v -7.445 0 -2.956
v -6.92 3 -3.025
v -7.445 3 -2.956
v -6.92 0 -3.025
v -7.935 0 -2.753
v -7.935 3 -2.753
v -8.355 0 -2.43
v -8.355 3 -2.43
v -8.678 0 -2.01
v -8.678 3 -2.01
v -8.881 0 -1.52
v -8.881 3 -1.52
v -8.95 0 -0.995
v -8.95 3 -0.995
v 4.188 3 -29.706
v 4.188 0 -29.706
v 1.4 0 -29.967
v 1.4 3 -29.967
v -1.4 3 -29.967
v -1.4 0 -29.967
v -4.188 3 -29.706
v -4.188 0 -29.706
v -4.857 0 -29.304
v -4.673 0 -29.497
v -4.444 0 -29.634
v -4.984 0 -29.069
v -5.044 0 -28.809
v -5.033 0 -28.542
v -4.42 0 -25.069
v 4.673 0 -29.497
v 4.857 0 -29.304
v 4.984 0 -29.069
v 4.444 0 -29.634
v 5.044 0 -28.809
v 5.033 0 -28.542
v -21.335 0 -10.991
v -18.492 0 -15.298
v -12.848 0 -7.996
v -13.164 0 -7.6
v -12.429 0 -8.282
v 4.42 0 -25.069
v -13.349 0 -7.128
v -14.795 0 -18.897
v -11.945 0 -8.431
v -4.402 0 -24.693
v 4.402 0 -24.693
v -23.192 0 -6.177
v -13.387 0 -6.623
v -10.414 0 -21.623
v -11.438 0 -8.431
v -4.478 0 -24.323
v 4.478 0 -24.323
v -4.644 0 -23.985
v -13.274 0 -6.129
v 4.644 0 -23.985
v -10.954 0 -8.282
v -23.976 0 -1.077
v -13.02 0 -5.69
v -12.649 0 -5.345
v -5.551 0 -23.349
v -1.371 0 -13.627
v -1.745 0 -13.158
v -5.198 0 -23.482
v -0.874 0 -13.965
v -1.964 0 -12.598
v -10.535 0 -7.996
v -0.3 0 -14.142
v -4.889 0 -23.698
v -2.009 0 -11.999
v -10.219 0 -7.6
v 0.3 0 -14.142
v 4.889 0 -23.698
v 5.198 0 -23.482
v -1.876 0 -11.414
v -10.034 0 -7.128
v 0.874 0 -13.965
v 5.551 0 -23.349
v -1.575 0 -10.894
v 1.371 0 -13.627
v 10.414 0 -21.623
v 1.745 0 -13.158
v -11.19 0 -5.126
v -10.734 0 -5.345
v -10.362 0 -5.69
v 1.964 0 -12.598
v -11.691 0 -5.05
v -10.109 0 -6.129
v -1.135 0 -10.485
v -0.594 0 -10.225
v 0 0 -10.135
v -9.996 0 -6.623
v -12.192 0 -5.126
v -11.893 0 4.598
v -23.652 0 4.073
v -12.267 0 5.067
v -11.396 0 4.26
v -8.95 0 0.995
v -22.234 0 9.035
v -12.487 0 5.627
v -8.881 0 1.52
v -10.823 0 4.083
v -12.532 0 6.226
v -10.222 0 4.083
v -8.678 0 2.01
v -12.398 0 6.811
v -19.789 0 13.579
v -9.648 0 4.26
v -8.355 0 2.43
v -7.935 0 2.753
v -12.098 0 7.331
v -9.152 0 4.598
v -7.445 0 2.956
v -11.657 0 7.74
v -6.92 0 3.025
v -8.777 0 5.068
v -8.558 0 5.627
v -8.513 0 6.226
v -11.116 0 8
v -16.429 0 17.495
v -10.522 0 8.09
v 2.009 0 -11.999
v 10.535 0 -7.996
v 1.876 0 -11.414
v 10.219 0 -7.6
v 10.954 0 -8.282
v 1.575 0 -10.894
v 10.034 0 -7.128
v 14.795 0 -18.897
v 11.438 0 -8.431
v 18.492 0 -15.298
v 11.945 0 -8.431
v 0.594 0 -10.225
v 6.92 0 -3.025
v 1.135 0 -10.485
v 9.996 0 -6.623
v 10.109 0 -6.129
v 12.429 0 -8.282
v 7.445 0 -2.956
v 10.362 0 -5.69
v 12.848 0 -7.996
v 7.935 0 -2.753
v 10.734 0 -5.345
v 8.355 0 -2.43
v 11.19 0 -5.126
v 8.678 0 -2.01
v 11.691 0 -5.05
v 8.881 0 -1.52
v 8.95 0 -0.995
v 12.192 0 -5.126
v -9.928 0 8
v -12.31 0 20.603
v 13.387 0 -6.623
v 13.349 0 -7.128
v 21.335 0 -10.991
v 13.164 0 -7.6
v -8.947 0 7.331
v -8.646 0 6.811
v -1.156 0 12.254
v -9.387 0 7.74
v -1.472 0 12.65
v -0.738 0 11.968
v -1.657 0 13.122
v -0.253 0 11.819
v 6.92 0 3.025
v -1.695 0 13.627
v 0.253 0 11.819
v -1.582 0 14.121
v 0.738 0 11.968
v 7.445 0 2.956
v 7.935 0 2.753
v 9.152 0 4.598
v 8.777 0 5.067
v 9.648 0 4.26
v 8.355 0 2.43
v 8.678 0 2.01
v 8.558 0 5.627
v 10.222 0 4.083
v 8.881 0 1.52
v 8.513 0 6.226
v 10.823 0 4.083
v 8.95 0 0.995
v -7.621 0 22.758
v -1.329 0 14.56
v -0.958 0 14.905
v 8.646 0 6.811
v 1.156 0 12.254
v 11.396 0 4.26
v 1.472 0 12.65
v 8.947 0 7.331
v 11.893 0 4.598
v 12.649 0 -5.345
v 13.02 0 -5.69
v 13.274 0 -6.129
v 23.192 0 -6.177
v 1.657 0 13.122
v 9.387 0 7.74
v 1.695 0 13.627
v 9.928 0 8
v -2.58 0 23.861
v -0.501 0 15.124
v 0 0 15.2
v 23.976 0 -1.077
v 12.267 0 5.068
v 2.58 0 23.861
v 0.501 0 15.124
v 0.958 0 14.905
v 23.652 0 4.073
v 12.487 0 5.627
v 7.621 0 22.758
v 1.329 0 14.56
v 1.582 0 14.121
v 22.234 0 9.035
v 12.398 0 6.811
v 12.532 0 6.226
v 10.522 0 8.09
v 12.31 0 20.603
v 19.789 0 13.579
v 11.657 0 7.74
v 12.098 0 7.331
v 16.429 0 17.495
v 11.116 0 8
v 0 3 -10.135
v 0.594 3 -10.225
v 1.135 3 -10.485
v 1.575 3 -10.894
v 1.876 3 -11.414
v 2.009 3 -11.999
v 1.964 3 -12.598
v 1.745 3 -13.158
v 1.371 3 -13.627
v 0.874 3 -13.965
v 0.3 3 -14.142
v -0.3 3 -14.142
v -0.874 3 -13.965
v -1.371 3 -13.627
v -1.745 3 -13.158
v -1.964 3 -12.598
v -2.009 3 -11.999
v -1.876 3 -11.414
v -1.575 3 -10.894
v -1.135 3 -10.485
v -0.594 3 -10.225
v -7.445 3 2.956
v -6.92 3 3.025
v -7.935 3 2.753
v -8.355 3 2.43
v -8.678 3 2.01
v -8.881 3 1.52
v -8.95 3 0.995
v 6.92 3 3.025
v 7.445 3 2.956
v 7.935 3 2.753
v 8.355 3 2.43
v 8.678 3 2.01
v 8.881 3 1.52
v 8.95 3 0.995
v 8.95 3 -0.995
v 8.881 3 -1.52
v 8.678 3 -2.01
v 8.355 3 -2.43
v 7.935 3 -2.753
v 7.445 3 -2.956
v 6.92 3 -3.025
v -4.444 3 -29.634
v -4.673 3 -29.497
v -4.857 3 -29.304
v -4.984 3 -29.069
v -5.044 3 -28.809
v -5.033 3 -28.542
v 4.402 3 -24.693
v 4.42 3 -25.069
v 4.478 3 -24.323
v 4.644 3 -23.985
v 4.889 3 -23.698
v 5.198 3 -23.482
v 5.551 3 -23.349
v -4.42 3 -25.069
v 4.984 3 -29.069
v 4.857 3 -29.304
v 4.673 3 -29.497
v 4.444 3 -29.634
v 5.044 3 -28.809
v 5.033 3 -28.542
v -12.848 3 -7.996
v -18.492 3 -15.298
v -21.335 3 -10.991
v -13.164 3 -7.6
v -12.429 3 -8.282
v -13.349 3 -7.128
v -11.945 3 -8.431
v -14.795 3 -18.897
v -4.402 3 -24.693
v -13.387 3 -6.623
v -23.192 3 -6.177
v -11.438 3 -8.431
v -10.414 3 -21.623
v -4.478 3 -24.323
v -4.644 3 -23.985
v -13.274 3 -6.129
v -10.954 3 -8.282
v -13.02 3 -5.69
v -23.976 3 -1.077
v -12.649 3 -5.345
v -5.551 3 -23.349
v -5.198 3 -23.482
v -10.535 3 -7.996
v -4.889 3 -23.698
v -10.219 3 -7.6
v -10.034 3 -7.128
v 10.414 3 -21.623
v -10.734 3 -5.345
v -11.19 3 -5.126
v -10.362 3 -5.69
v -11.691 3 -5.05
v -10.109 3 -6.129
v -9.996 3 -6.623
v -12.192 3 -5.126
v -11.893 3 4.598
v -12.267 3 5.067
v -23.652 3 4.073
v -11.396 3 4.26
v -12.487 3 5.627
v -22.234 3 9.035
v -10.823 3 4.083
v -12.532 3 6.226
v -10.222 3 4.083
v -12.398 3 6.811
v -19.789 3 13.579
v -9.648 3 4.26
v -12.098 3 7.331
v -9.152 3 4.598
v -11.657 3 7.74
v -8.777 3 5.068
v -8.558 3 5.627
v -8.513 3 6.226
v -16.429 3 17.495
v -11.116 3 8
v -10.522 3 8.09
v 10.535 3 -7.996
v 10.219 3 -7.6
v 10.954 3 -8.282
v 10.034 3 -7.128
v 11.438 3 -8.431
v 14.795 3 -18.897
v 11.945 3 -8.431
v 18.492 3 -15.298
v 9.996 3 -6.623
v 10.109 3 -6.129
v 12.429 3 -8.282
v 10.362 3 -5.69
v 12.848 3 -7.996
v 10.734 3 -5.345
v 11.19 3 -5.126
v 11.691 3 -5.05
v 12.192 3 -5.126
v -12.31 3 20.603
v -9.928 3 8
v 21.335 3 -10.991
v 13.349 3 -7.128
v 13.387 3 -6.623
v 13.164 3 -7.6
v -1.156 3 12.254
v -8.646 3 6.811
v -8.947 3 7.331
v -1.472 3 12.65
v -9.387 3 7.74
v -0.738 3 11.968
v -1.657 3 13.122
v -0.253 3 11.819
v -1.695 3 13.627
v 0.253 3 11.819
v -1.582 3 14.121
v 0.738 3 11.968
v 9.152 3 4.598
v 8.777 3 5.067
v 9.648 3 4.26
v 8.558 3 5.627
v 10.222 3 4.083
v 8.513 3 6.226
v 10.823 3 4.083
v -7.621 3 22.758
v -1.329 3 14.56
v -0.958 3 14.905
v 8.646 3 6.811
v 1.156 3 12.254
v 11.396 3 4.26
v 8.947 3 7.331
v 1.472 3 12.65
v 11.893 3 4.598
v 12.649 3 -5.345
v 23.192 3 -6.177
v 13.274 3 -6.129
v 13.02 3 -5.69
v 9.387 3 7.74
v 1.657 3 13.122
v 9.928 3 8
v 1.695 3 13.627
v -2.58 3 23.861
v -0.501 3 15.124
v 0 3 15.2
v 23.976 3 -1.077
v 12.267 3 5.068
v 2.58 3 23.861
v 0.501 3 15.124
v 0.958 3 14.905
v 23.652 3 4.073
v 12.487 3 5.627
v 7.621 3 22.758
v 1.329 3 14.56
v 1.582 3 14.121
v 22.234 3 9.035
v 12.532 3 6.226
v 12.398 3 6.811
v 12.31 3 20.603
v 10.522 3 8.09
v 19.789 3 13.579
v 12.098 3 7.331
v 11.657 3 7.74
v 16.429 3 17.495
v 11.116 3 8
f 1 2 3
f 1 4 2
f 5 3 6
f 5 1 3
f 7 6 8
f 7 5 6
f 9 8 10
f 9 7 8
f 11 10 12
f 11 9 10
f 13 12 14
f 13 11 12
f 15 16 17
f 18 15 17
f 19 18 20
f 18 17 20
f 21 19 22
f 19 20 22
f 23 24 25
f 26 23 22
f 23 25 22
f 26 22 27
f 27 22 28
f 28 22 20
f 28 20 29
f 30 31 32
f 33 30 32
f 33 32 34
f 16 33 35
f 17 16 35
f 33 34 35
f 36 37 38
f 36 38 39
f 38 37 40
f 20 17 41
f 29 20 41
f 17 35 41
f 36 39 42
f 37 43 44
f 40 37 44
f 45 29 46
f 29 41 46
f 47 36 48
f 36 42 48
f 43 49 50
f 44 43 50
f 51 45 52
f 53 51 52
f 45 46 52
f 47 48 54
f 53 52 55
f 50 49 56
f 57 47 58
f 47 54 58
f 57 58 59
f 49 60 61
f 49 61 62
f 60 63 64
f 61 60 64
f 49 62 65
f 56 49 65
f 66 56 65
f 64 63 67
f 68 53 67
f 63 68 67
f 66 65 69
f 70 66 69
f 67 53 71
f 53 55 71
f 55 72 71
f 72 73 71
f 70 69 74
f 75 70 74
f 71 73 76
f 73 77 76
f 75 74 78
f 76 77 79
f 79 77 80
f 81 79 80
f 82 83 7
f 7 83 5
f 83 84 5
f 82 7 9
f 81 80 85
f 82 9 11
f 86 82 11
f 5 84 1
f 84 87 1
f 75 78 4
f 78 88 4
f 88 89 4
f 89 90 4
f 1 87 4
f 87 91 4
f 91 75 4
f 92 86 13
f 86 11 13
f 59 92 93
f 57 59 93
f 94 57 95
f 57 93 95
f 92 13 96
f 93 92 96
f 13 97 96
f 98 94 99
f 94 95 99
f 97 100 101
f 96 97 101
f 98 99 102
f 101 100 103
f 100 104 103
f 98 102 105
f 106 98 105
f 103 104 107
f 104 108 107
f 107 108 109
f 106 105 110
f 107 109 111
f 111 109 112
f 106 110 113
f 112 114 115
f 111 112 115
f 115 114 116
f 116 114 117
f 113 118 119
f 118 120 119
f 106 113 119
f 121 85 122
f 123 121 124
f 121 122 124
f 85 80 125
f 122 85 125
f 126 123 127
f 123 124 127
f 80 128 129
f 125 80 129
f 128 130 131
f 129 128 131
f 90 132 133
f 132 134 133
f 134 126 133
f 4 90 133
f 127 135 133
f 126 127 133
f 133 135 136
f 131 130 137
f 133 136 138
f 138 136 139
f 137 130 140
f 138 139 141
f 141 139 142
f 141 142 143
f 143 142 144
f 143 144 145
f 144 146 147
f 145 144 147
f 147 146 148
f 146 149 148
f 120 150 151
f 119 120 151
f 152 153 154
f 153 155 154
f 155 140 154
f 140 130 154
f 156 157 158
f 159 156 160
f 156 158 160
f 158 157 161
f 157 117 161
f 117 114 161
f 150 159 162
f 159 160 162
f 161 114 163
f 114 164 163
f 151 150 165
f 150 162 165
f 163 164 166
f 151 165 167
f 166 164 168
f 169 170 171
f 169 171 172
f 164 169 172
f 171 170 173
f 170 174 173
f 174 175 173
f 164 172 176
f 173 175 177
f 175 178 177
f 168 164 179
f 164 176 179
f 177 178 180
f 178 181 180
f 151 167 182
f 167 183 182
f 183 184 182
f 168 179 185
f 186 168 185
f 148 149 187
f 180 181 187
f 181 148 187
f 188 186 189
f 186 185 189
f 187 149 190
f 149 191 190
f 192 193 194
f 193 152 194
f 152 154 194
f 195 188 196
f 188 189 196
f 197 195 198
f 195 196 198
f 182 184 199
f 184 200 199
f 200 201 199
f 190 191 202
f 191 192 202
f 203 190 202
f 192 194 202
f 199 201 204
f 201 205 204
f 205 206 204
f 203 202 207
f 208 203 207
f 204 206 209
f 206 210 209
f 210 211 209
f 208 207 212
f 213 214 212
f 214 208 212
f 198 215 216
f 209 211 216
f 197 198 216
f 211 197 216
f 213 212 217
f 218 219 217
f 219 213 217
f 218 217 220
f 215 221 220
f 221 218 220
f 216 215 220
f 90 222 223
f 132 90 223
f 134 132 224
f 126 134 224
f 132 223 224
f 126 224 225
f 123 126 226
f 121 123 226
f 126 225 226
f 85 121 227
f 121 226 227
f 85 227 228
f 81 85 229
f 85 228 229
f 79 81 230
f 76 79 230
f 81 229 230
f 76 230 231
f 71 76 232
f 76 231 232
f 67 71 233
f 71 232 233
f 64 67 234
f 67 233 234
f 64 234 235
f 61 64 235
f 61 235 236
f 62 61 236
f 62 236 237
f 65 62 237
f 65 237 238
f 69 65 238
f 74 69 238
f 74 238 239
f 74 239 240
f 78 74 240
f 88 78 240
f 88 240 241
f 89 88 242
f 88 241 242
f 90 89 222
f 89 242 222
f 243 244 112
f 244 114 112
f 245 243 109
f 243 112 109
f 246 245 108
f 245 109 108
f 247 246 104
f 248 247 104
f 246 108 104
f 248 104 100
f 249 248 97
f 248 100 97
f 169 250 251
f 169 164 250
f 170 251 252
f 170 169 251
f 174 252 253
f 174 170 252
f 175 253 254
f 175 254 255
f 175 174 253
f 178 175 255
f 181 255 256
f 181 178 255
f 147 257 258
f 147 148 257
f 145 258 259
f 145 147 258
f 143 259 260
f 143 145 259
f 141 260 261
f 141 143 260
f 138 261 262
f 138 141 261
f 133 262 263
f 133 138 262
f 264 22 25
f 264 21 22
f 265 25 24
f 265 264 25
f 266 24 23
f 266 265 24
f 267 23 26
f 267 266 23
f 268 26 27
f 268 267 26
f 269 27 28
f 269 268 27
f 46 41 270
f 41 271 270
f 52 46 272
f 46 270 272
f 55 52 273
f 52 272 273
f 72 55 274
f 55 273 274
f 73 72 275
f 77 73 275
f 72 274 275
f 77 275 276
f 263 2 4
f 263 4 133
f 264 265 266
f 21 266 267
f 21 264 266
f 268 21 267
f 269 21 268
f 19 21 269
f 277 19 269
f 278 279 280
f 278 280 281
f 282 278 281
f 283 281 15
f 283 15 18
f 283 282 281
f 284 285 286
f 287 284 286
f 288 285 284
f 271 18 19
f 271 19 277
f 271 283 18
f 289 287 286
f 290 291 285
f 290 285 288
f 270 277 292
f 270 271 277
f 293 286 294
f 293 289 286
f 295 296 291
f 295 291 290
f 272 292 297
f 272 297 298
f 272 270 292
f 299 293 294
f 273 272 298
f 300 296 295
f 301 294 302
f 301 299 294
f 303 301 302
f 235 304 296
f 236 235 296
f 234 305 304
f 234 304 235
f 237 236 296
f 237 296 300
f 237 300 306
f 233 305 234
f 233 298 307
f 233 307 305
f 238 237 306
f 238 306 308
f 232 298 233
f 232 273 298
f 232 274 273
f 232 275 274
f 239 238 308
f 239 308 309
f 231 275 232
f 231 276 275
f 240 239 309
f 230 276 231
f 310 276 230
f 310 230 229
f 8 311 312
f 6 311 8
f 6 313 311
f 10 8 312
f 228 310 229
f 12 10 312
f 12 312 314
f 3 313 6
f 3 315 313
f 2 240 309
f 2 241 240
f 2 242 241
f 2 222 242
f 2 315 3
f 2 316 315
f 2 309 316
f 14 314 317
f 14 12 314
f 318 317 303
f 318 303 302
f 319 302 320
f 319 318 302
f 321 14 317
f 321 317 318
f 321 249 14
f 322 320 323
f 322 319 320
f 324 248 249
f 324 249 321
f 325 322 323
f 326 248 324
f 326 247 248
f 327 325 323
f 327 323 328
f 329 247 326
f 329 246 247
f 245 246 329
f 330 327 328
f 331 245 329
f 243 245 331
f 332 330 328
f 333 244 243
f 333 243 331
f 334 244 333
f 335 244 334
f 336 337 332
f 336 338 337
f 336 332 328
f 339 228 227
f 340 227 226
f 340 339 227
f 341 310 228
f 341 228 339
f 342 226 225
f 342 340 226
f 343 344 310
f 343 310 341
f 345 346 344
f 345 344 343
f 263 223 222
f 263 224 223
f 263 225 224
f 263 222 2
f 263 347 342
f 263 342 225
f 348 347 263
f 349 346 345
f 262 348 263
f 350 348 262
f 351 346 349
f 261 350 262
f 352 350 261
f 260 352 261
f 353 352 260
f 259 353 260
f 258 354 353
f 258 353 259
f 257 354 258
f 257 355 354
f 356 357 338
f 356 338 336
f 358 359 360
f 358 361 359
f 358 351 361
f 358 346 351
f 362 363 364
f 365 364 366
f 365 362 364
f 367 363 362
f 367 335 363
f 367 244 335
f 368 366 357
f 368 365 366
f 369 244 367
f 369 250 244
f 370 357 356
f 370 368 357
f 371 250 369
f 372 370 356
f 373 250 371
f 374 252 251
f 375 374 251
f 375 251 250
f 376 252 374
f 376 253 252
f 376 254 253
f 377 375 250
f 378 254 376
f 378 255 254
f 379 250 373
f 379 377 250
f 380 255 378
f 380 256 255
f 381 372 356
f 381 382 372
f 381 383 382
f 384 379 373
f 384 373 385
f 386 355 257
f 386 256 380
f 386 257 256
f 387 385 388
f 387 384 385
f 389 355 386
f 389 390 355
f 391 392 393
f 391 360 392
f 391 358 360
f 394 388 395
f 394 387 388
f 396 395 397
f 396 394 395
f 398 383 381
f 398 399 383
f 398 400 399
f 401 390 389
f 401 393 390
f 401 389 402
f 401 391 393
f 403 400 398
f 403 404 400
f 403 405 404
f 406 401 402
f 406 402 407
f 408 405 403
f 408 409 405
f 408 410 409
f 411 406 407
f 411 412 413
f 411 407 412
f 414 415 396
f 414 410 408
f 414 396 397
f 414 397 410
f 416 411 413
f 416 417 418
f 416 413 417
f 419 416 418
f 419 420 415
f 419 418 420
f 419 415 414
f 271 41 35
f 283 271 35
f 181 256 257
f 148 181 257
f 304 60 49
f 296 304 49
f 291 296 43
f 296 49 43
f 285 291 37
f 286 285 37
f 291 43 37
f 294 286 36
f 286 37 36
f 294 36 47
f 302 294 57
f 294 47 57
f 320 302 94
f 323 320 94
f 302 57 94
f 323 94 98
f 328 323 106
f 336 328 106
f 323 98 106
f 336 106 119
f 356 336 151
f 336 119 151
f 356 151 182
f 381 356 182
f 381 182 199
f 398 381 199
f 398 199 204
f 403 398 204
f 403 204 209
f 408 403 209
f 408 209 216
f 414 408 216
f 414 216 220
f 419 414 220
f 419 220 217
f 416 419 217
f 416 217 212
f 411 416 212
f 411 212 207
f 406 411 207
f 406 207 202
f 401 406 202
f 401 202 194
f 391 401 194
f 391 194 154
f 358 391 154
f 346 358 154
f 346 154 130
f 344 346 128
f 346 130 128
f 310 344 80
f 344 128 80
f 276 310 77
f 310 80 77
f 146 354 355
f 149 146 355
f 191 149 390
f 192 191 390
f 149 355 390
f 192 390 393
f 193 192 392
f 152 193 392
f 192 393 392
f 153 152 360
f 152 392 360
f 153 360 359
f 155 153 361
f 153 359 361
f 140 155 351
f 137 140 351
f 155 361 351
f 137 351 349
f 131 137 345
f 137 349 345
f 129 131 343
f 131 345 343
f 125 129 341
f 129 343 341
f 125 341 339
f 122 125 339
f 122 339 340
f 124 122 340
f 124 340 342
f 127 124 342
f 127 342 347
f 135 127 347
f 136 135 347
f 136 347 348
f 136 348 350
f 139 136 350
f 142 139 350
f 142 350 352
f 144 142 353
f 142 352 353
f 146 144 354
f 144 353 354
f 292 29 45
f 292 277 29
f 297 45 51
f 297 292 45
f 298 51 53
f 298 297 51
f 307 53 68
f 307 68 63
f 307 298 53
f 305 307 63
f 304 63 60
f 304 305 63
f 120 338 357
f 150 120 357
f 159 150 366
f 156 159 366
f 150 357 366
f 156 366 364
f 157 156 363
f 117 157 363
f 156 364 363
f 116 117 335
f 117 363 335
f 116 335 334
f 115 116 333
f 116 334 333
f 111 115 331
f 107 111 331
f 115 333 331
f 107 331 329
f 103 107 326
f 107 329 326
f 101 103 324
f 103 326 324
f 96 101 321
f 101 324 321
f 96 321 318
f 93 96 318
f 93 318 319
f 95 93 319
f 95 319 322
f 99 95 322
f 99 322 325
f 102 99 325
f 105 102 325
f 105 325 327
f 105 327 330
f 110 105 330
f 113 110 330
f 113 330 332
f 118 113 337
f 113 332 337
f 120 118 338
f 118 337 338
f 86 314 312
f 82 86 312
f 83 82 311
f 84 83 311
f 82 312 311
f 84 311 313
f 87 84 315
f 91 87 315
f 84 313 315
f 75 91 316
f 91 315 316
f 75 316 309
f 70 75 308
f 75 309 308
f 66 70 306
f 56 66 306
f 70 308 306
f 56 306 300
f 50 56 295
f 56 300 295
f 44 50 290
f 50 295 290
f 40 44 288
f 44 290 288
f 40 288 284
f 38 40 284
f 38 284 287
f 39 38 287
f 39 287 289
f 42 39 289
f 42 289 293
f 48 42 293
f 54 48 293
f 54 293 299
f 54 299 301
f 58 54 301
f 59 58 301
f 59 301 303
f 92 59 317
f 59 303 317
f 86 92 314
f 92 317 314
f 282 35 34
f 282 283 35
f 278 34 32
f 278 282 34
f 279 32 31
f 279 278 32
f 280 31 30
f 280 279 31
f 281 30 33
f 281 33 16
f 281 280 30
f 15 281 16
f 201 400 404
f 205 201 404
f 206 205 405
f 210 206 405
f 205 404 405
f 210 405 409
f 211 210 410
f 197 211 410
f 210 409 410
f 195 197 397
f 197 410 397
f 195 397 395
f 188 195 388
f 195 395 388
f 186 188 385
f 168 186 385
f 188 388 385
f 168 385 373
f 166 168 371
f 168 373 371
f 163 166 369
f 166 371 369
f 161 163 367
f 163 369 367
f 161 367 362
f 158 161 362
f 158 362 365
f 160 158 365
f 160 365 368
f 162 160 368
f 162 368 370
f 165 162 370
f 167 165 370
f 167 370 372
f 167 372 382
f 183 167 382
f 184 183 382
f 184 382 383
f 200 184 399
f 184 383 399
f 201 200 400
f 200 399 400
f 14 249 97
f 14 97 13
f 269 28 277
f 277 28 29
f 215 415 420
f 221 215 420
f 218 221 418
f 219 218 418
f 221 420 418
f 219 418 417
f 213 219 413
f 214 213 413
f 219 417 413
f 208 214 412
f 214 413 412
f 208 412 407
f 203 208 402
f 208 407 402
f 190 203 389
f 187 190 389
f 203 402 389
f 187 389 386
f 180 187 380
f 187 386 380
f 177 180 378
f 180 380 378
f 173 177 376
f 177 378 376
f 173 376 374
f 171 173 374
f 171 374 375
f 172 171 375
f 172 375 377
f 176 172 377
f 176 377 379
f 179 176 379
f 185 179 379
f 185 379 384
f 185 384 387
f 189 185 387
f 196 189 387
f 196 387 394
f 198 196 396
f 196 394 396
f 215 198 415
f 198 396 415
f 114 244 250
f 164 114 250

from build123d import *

# Parameters (mm, degrees)
SKETCH_1_R          = 30
EXTRUDE_1_DEPTH     = 3
SKETCH_2_R          = 1.7
SKETCH_2_R_2        = 2.015
CUT_EXTRUDE_1_DEPTH = 3
CUT_EXTRUDE_START   = -3
CUT_EXTRUDE_2_DEPTH = 3
FILLET_1_R          = 1.5
FILLET_2_R          = 1
SKETCH_4_W          = 17.9
SKETCH_4_H          = 6.05
CUT_EXTRUDE_3_DEPTH = 10
FILLET_3_R          = 2.03


with BuildPart() as part:
    # 草图1 → 凸台-拉伸1 (new body)
    with BuildSketch(Plane(origin=(0, 0, 0), x_dir=(1, 0, 0), z_dir=(0, 1, 0))):
        with Locations(Location((0, 0, 0), (0, 0, 270))):
            Circle(SKETCH_1_R)
    extrude(amount=EXTRUDE_1_DEPTH)

    # 草图2 → 切除-拉伸1 (cut)
    with BuildSketch(Plane(origin=(0, 3, 0), x_dir=(1, 0, 0), z_dir=(0, 1, 0))):
        with Locations(Location((0, -13.5, 0), (0, 0, 270))):
            Circle(SKETCH_2_R)
        with Locations(Location((-11.691342951, 6.75, 0), (0, 0, 270))):
            Circle(SKETCH_2_R)
        with Locations(Location((11.691342951, 6.75, 0), (0, 0, 270))):
            Circle(SKETCH_2_R)
        with Locations(Location((10.522208656, -6.075, 0), (0, 0, 270))):
            Circle(SKETCH_2_R_2)
        with Locations(Location((-10.522208656, -6.075, 0), (0, 0, 270))):
            Circle(SKETCH_2_R_2)
        with Locations(Location((0, 12.15, 0), (0, 0, 270))):
            Circle(SKETCH_2_R_2)
    extrude(amount=-CUT_EXTRUDE_1_DEPTH, mode=Mode.SUBTRACT)

    # 草图3 → 切除-拉伸2 (cut)
    with BuildSketch(Plane(origin=(0, 3, 0), x_dir=(1, 0, 0), z_dir=(0, 1, 0)).offset(CUT_EXTRUDE_START)):
        with BuildLine():
            Line((-5.20944533, 29.54423259), (-4.167556264, 23.635386072))
            ThreePointArc((-4.167556264, 23.635386072), (0, -24), (4.167556264, 23.635386072))
            Line((4.167556264, 23.635386072), (5.20944533, 29.54423259))
            ThreePointArc((5.20944533, 29.54423259), (0, -30), (-5.20944533, 29.54423259))
        make_face()
    extrude(amount=CUT_EXTRUDE_2_DEPTH, mode=Mode.SUBTRACT)

    # 圆角1
    fillet_1_edges = [part.edges().sort_by_distance(p)[0] for p in [
        (-4.167556264, 1.5, -23.635386072),
        (4.167556264, 1.5, -23.635386072),
    ]]
    fillet(fillet_1_edges, radius=FILLET_1_R)

    # 圆角2
    fillet_2_edges = [part.edges().sort_by_distance(p)[0] for p in [
        (5.20944533, 1.5, -29.54423259),
        (-5.20944533, 1.5, -29.54423259),
    ]]
    fillet(fillet_2_edges, radius=FILLET_2_R)

    # 草图4 → 切除-拉伸3 (cut)
    with BuildSketch(Plane(origin=(0, 3, 0), x_dir=(1, 0, 0), z_dir=(0, 1, 0))):
        Rectangle(SKETCH_4_W, SKETCH_4_H)
    extrude(amount=-CUT_EXTRUDE_3_DEPTH, mode=Mode.SUBTRACT)

    # 圆角3
    fillet_3_edges = [part.edges().sort_by_distance(p)[0] for p in [
        (8.95, 1.5, -3.025),
        (8.95, 1.5, 3.025),
        (-8.95, 1.5, 3.025),
        (-8.95, 1.5, -3.025),
    ]]
    fillet(fillet_3_edges, radius=FILLET_3_R)


solid = part.part
